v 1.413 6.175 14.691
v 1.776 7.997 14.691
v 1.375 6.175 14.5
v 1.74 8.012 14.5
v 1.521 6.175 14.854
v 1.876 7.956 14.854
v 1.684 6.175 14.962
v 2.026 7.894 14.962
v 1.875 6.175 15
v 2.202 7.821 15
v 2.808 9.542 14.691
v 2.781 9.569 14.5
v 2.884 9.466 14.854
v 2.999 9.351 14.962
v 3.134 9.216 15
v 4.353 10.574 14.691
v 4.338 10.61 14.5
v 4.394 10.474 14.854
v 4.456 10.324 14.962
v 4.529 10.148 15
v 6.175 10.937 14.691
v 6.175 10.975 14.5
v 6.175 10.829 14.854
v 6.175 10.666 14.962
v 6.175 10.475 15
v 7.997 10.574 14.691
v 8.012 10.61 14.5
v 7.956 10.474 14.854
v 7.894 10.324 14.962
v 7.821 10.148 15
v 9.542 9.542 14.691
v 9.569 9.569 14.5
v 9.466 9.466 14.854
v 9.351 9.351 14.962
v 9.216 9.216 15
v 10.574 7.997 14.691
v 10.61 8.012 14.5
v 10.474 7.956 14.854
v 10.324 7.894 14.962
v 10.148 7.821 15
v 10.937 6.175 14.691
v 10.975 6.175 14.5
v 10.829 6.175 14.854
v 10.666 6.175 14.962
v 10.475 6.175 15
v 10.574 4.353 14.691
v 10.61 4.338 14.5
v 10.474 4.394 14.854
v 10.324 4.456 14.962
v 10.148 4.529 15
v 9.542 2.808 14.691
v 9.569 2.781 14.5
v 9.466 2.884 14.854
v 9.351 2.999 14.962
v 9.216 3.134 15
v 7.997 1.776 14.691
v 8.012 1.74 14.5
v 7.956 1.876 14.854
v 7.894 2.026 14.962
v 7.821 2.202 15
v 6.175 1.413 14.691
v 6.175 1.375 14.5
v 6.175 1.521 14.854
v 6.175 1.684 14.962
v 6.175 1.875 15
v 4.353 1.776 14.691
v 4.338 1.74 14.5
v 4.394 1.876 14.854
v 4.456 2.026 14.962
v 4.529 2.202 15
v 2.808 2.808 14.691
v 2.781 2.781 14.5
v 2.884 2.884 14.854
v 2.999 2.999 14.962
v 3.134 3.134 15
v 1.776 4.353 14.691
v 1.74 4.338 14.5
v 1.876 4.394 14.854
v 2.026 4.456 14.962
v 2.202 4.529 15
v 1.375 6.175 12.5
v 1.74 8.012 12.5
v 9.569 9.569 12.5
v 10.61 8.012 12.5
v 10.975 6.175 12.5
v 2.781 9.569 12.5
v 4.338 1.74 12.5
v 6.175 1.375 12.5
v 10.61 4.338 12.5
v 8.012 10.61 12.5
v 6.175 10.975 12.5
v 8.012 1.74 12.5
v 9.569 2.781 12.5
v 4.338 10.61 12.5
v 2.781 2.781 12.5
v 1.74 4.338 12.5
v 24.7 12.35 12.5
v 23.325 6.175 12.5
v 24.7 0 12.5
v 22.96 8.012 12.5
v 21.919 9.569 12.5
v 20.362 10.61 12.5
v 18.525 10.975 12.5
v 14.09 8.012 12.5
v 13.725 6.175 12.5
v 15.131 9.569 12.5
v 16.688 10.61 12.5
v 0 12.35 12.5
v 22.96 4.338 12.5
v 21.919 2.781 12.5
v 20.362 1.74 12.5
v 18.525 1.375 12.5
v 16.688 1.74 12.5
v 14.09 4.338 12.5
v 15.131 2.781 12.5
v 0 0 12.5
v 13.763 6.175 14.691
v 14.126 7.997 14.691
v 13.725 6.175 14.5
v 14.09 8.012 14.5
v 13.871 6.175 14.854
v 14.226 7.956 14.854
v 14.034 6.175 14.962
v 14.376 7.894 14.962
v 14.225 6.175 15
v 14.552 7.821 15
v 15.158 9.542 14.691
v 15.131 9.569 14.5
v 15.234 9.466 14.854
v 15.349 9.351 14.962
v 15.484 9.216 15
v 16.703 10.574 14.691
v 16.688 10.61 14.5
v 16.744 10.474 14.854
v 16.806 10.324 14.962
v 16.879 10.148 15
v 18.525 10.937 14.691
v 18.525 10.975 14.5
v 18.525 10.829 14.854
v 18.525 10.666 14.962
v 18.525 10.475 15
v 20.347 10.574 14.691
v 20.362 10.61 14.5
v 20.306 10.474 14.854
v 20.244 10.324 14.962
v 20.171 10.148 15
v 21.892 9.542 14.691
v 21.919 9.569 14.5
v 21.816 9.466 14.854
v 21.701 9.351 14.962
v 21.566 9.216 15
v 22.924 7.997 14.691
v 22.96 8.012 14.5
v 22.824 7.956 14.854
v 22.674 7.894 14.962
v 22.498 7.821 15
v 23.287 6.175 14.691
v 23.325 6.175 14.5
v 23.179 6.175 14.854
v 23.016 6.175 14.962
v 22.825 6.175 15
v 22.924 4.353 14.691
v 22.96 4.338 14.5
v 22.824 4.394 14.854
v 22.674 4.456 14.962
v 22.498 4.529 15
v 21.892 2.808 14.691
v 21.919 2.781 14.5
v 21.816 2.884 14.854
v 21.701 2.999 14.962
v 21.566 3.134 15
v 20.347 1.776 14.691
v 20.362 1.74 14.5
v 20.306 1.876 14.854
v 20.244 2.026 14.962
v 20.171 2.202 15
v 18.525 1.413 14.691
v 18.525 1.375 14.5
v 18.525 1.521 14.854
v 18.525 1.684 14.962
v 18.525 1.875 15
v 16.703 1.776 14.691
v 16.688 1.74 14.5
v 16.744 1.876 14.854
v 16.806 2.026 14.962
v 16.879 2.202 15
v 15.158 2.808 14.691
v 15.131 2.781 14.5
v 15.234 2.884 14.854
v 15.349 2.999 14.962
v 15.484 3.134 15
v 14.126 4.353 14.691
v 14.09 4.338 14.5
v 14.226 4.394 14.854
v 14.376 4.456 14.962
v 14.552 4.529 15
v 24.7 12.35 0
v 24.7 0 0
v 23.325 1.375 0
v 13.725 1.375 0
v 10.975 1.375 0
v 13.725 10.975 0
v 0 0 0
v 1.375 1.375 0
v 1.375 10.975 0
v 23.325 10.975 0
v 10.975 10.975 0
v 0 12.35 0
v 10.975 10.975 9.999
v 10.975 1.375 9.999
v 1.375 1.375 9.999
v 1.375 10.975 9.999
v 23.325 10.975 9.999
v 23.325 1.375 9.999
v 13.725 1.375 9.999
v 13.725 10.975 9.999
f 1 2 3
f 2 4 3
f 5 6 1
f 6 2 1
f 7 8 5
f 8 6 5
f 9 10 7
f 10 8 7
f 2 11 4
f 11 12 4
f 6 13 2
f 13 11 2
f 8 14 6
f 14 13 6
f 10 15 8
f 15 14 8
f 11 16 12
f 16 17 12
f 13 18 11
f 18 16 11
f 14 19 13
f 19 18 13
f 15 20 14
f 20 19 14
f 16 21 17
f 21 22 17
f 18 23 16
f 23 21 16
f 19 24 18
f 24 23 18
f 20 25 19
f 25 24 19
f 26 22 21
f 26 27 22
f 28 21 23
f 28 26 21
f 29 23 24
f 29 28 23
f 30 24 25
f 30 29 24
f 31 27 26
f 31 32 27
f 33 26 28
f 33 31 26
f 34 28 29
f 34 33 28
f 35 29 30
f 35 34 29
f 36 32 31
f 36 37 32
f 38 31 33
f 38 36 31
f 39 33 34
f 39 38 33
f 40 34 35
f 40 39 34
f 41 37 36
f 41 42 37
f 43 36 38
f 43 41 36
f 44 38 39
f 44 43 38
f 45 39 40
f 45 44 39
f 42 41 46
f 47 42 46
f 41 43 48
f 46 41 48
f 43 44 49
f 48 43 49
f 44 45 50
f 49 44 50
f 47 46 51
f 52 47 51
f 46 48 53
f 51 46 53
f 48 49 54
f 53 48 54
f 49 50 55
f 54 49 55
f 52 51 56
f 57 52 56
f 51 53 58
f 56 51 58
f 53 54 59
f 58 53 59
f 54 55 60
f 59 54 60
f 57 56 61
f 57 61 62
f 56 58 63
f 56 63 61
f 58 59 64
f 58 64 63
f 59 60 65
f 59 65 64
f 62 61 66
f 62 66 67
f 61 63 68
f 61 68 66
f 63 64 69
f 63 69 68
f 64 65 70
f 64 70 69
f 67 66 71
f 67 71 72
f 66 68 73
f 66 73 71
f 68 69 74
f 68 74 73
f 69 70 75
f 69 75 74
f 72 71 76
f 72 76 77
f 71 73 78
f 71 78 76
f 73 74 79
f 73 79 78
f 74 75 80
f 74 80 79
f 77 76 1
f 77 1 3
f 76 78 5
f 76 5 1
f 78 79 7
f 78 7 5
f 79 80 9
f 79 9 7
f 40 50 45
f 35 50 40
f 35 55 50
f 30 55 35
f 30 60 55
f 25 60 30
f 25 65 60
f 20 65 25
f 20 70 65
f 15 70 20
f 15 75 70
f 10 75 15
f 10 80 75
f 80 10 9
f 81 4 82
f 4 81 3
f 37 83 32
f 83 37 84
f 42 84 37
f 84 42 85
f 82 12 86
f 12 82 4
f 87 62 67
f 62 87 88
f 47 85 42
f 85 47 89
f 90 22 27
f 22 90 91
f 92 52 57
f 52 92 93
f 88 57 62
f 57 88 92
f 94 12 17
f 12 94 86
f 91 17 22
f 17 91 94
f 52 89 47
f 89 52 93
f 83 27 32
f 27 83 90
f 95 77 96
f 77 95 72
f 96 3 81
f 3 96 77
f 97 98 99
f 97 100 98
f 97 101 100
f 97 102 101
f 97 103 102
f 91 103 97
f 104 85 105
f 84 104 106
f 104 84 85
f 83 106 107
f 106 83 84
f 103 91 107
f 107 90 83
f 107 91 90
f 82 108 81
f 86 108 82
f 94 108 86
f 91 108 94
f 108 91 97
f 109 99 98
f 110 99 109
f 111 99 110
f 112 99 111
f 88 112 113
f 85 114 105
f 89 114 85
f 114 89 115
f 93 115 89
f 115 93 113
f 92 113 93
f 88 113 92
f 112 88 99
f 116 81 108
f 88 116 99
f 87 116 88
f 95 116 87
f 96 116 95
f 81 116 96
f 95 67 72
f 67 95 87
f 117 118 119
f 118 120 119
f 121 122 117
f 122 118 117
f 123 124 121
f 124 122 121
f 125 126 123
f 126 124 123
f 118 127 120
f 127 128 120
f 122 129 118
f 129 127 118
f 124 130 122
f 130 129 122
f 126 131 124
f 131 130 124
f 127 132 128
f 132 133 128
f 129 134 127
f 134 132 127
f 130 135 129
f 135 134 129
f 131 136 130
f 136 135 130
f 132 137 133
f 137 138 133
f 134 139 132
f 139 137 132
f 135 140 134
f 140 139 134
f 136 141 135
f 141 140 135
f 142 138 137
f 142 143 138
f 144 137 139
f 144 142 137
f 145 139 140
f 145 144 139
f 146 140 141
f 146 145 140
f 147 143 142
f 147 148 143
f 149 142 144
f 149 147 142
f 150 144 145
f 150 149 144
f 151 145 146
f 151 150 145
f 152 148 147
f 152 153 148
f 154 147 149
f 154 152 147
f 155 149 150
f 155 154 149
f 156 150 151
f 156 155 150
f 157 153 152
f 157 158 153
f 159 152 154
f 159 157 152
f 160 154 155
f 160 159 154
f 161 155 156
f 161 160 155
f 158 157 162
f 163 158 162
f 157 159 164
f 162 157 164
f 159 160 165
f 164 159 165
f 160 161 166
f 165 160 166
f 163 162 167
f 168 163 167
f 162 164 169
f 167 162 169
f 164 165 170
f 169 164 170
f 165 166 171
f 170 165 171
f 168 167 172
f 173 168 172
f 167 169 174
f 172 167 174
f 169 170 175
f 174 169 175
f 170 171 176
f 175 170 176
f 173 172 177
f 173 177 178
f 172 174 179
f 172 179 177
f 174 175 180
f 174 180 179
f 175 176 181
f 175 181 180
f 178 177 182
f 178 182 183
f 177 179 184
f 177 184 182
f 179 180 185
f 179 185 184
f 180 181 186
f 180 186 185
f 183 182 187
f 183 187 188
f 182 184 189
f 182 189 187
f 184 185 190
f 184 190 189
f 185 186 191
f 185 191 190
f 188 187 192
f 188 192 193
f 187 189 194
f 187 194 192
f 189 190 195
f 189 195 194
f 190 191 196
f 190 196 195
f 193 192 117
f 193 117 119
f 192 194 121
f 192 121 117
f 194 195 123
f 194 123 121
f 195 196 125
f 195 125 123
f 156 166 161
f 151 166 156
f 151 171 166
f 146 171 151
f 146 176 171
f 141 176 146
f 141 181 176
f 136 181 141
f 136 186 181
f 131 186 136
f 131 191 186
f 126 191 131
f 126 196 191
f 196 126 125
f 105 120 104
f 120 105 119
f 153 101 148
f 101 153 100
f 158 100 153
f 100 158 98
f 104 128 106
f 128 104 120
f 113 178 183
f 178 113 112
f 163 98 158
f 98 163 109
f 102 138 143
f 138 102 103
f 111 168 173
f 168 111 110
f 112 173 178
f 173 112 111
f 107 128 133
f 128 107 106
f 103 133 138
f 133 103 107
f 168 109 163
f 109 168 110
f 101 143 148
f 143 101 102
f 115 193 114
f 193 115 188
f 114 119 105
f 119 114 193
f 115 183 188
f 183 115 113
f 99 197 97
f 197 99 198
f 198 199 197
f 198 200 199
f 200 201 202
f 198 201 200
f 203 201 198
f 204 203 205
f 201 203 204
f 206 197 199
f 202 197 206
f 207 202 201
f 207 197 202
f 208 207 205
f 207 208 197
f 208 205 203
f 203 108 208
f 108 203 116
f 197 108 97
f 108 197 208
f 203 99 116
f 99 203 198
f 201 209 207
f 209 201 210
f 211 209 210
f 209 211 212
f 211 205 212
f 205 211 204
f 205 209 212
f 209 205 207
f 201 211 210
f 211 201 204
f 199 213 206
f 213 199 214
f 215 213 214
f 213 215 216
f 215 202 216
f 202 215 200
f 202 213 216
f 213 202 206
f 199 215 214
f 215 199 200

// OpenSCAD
//---------------------------------------------------------------
//   Generador de piezas Exin Castillos
//
//   Publicado bajo licencia Creative Commons Atribucion-NoComercial-CompartirIgual:
//     https://creativecommons.org/licenses/by-nc-sa/4.0/deed.es
//   Released under the Creative Commons Attribution-Non Commercial-ShareAlike license:
//     https://creativecommons.org/licenses/by-nc-sa/4.0/
//---------------------------------------------------------------

/* [Comun] */
tipo_pieza = 1; //[1:Bloque/Placa, 2:Curva, 3:Poligono, 4:Esquina]
//Es un remate liso o tiene tetones
es_remate = 0; //[1:Si, 0:No]
//Altura de la pieza en exinios
altura = 1; //[0.5:0.5:2]

/* [Bloque] */
//Anchura del bloque
anchura = 2; //[1:20]
//Largura del bloque
largura = 1; //[1:20]

/* [Curva] */
//Diametro en exinios de la curva
diametro = 7; //[5:2:19]
//Numero total de tetones de la circunferencia
numero_tetones = 16; //[8:4:64]
//Los tetones de la pieza, no rebasar el medio arco
tetones_corte = 3; //[1:64]
//Recto si ira junto a un bloque
tipo_corte_1 = 1; //[1:Recto, -1:Diagonal]
//Recto si ira junto a un bloque
tipo_corte_2 = 1; //[1:Recto, -1:Diagonal]

/* [Poligonal] */
//Numero de lados del poligono
lados_poligono = 3; //[3:12]

/* [Esquina] */
//Angulo de la esquina
angulo_esquina = 90; //[15:90]

/* [Hidden] */
exinio = 12.35;
exiniz = 12.5;
tetonr = 4.8; //radio teton
tetonz = 2; //altura teton (sin parte biselada)
tetonbr = 0.5; //radio parte biselada teton
huecox = 2*tetonr; //anchura hueco
grosorx = (exinio-huecox)/2; //grosor pared exterior lateral
grosorz = 2.5; //grosor pared superior
detalle = 16; // definicion de las curvas


mostrar();

module mostrar(){
   if(tipo_pieza==1) bloque();
   else if (tipo_pieza==2) curva();
   else if (tipo_pieza==3) poligono();
   else if (tipo_pieza==4) esquina(angulo_esquina);
}

module bloque(){
   difference(){
      //bloque macizo y tetones
      union(){
         cube([anchura*exinio, largura*exinio, altura*exiniz]);
         if(es_remate==0)
            for(x=[1:anchura])
               for(y=[1:largura])
                  translate([exinio*(x-0.5), exinio*(y-0.5), 1*altura*exiniz]) 
                     teton();
      }
      //huecos
      union(){
         for(x=[1:anchura])
            for(y=[1:largura])
               translate([exinio*(x-0.5), exinio*(y-0.5), 0]) 
                  hueco();
      }
   }
}

module baldosa(){
   difference(){
      cube([anchura*exinio, largura*exinio, altura*exiniz]);
      union(){
         for(x=[1:anchura])
            for(y=[1:largura])
               translate([exinio*(x-0.5), exinio*(y-0.5), 0]) 
                  hueco();
      }
   }
}

module curva(){
   //bloque
   difference(){
      union(){
         cylinder(altura*exiniz, d=diametro*exinio, $fn=detalle*diametro);
         //tetones
         if(es_remate==0)
            for(n=[1:numero_tetones])
               rotate([0,0,360/numero_tetones*n])
                  translate([(diametro-1)/2*exinio, 0, altura*exiniz])
                     teton();
      }
      union(){
         //hueco central
         translate([0,0,-.5])
            cylinder(altura*exiniz+1, d=(diametro-2)*exinio, $fn=detalle*(diametro-2));
         //hueco bajos
         translate([0,0,(altura*exiniz-grosorz)/2])
            rotate_extrude($fn=detalle*diametro)
               translate([(diametro-1)/2*exinio, 0, 0])
                  square([huecox,altura*exiniz-grosorz+.001], true);
         //corte
         union(){
            translate([-diametro*exinio*0.55, tipo_corte_1*exinio/2, -(altura*exiniz-tetonz)*.5])
             cube([diametro*exinio*1.1, diametro*exinio, (altura*exiniz+tetonz)*2]);
            rotate([0,0,180+360/numero_tetones*(tetones_corte-(tipo_corte_1+tipo_corte_2)/2)])
                translate([-diametro*exinio*0.55, tipo_corte_2*exinio/2, -(altura*exiniz-tetonz)*.5])
                 cube([diametro*exinio*1.1, diametro*exinio, (altura*exiniz+tetonz)*2]);
         }
      }
   }
   //pared corte 1
   if((diametro<=7)&&(tipo_corte_1<0))
      translate([-(diametro-2)/2*exinio*cos(360/numero_tetones/diametro*2) -grosorx/2*0 , exinio/2*tipo_corte_1, 0])
          rotate([0,0,180])
           cube([huecox+grosorx, grosorx, altura*exiniz]);
   else
      translate([-(diametro-2)/2*exinio*cos(360/numero_tetones/diametro*2) -grosorx/2 , exinio/2*tipo_corte_1, 0])
          rotate([0,0,180])
           cube([huecox+grosorx, grosorx, altura*exiniz]);
   
   //pared corte 2
   if((diametro<=7)&&(tipo_corte_1<0))
       rotate([0,0,360/numero_tetones*(tetones_corte-(tipo_corte_1+tipo_corte_2)/2)])
           translate([-(diametro)/2*exinio*cos(360/numero_tetones/diametro*2) +grosorx/1.25 , -exinio/2*tipo_corte_2, 0])
                   cube([huecox+grosorx, grosorx, altura*exiniz]);
   else
       rotate([0,0,360/numero_tetones*(tetones_corte-(tipo_corte_1+tipo_corte_2)/2)])
           translate([-(diametro)/2*exinio*cos(360/numero_tetones/diametro*2) +grosorx/2 , -exinio/2*tipo_corte_2, 0])
                   cube([huecox+grosorx, grosorx, altura*exiniz]);
}

module poligono(){
   if(lados_poligono>4){
      union(){
         partePoligono();
         mirror([1,0,0]) partePoligono();
      }
   }
   else{
      esquina(30*lados_poligono - 30);
   }
}

module esquina(ang){
   union(){
      parteEsquina(ang);
      mirror([1,0,0]) parteEsquina(ang);
      //teton medio
      if(es_remate==0)
         translate([0, exinio/(2*sin(ang/2)), 2*exiniz])
            teton();
   }
}

module parteEsquina(ang){
   difference(){
      rotate([0,0, -ang/2])
         difference(){
            union(){
               //bloque macizo y teton extremo
               translate([-exinio,-exinio,0])
                  cube([exinio, 9*exinio, 2*exiniz]); //15 grados: 8+1 exinio (1/tan(ang/2)+1)
               if(es_remate==0)
                  translate([-exinio/2, -exinio/2, 2*exiniz])
                     teton();
            }
            //huecos
            union(){
               //hueco bajo teton
               translate([grosorx-exinio, grosorx-exinio, -0.001]) 
                  cube([huecox,huecox,2*exiniz-grosorz]);
               //hueco bajo esquina
               translate([grosorx-exinio, grosorx, -0.001]) 
                  cube([exinio,huecox+8*exinio,2*exiniz-grosorz]);
               //quita un exinio bajo la parte del teton
               translate([-exinio,-exinio,0])
                  cube([exinio, exinio, exiniz]);
               //corte para placa y baldosa
               if(altura < 1)
                  translate([-exinio,-exinio,0])
                     cube([2*exinio, 9*exinio, 1.5*exiniz]);
            }
         }
      //plano de corte
      translate([0, 0, -.5*exiniz])
         cube([6*exinio, 12*exinio, 3*exiniz]);
   }
}


module partePoligono(){
   difference(){
      rotate([0,0, -180/lados_poligono])
         difference(){
            union(){
               //bloque macizo y teton
               translate([-exinio,0,0])
                  cube([2*exinio, exinio, 2*exiniz]);
               if(es_remate==0)
                  translate([exinio/2, exinio/2, 2*exiniz])
                     teton();
            }
            //huecos
            union(){
               //huecos bajo teton y esquina
               for(n=[0:1])
                  translate([grosorx-exinio*n, grosorx, -0.001]) 
                     cube([huecox,huecox,2*exiniz-grosorz]);
               //quita un exinio bajo la parte del teton
               cube([exinio, exinio, exiniz]);
               //corte para placa y baldosa
               if(altura < 1)
                  translate([-exinio,0,0])
                     cube([2*exinio, exinio, 1.5*exiniz]);
            }
         }
      //plano de corte
      translate([-2*exinio, 0, 0])
         cube([2*exinio, 2*exinio, 2*exiniz]);
   }
}

module teton(){
   union(){
      cylinder(tetonz, r=tetonr, $fn=detalle);
      translate([0,0,tetonz]){
         rotate_extrude($fn=detalle)
            translate([tetonr-tetonbr,0,0])
               circle(tetonbr, $fn=16);
         cylinder(tetonbr, r=tetonr-tetonbr, $fn=detalle);
      }
   }
}

module hueco(){
   translate([grosorx-exinio/2, grosorx-exinio/2, -0.001])
      cube([huecox,huecox,altura*exiniz-grosorz]);
}
